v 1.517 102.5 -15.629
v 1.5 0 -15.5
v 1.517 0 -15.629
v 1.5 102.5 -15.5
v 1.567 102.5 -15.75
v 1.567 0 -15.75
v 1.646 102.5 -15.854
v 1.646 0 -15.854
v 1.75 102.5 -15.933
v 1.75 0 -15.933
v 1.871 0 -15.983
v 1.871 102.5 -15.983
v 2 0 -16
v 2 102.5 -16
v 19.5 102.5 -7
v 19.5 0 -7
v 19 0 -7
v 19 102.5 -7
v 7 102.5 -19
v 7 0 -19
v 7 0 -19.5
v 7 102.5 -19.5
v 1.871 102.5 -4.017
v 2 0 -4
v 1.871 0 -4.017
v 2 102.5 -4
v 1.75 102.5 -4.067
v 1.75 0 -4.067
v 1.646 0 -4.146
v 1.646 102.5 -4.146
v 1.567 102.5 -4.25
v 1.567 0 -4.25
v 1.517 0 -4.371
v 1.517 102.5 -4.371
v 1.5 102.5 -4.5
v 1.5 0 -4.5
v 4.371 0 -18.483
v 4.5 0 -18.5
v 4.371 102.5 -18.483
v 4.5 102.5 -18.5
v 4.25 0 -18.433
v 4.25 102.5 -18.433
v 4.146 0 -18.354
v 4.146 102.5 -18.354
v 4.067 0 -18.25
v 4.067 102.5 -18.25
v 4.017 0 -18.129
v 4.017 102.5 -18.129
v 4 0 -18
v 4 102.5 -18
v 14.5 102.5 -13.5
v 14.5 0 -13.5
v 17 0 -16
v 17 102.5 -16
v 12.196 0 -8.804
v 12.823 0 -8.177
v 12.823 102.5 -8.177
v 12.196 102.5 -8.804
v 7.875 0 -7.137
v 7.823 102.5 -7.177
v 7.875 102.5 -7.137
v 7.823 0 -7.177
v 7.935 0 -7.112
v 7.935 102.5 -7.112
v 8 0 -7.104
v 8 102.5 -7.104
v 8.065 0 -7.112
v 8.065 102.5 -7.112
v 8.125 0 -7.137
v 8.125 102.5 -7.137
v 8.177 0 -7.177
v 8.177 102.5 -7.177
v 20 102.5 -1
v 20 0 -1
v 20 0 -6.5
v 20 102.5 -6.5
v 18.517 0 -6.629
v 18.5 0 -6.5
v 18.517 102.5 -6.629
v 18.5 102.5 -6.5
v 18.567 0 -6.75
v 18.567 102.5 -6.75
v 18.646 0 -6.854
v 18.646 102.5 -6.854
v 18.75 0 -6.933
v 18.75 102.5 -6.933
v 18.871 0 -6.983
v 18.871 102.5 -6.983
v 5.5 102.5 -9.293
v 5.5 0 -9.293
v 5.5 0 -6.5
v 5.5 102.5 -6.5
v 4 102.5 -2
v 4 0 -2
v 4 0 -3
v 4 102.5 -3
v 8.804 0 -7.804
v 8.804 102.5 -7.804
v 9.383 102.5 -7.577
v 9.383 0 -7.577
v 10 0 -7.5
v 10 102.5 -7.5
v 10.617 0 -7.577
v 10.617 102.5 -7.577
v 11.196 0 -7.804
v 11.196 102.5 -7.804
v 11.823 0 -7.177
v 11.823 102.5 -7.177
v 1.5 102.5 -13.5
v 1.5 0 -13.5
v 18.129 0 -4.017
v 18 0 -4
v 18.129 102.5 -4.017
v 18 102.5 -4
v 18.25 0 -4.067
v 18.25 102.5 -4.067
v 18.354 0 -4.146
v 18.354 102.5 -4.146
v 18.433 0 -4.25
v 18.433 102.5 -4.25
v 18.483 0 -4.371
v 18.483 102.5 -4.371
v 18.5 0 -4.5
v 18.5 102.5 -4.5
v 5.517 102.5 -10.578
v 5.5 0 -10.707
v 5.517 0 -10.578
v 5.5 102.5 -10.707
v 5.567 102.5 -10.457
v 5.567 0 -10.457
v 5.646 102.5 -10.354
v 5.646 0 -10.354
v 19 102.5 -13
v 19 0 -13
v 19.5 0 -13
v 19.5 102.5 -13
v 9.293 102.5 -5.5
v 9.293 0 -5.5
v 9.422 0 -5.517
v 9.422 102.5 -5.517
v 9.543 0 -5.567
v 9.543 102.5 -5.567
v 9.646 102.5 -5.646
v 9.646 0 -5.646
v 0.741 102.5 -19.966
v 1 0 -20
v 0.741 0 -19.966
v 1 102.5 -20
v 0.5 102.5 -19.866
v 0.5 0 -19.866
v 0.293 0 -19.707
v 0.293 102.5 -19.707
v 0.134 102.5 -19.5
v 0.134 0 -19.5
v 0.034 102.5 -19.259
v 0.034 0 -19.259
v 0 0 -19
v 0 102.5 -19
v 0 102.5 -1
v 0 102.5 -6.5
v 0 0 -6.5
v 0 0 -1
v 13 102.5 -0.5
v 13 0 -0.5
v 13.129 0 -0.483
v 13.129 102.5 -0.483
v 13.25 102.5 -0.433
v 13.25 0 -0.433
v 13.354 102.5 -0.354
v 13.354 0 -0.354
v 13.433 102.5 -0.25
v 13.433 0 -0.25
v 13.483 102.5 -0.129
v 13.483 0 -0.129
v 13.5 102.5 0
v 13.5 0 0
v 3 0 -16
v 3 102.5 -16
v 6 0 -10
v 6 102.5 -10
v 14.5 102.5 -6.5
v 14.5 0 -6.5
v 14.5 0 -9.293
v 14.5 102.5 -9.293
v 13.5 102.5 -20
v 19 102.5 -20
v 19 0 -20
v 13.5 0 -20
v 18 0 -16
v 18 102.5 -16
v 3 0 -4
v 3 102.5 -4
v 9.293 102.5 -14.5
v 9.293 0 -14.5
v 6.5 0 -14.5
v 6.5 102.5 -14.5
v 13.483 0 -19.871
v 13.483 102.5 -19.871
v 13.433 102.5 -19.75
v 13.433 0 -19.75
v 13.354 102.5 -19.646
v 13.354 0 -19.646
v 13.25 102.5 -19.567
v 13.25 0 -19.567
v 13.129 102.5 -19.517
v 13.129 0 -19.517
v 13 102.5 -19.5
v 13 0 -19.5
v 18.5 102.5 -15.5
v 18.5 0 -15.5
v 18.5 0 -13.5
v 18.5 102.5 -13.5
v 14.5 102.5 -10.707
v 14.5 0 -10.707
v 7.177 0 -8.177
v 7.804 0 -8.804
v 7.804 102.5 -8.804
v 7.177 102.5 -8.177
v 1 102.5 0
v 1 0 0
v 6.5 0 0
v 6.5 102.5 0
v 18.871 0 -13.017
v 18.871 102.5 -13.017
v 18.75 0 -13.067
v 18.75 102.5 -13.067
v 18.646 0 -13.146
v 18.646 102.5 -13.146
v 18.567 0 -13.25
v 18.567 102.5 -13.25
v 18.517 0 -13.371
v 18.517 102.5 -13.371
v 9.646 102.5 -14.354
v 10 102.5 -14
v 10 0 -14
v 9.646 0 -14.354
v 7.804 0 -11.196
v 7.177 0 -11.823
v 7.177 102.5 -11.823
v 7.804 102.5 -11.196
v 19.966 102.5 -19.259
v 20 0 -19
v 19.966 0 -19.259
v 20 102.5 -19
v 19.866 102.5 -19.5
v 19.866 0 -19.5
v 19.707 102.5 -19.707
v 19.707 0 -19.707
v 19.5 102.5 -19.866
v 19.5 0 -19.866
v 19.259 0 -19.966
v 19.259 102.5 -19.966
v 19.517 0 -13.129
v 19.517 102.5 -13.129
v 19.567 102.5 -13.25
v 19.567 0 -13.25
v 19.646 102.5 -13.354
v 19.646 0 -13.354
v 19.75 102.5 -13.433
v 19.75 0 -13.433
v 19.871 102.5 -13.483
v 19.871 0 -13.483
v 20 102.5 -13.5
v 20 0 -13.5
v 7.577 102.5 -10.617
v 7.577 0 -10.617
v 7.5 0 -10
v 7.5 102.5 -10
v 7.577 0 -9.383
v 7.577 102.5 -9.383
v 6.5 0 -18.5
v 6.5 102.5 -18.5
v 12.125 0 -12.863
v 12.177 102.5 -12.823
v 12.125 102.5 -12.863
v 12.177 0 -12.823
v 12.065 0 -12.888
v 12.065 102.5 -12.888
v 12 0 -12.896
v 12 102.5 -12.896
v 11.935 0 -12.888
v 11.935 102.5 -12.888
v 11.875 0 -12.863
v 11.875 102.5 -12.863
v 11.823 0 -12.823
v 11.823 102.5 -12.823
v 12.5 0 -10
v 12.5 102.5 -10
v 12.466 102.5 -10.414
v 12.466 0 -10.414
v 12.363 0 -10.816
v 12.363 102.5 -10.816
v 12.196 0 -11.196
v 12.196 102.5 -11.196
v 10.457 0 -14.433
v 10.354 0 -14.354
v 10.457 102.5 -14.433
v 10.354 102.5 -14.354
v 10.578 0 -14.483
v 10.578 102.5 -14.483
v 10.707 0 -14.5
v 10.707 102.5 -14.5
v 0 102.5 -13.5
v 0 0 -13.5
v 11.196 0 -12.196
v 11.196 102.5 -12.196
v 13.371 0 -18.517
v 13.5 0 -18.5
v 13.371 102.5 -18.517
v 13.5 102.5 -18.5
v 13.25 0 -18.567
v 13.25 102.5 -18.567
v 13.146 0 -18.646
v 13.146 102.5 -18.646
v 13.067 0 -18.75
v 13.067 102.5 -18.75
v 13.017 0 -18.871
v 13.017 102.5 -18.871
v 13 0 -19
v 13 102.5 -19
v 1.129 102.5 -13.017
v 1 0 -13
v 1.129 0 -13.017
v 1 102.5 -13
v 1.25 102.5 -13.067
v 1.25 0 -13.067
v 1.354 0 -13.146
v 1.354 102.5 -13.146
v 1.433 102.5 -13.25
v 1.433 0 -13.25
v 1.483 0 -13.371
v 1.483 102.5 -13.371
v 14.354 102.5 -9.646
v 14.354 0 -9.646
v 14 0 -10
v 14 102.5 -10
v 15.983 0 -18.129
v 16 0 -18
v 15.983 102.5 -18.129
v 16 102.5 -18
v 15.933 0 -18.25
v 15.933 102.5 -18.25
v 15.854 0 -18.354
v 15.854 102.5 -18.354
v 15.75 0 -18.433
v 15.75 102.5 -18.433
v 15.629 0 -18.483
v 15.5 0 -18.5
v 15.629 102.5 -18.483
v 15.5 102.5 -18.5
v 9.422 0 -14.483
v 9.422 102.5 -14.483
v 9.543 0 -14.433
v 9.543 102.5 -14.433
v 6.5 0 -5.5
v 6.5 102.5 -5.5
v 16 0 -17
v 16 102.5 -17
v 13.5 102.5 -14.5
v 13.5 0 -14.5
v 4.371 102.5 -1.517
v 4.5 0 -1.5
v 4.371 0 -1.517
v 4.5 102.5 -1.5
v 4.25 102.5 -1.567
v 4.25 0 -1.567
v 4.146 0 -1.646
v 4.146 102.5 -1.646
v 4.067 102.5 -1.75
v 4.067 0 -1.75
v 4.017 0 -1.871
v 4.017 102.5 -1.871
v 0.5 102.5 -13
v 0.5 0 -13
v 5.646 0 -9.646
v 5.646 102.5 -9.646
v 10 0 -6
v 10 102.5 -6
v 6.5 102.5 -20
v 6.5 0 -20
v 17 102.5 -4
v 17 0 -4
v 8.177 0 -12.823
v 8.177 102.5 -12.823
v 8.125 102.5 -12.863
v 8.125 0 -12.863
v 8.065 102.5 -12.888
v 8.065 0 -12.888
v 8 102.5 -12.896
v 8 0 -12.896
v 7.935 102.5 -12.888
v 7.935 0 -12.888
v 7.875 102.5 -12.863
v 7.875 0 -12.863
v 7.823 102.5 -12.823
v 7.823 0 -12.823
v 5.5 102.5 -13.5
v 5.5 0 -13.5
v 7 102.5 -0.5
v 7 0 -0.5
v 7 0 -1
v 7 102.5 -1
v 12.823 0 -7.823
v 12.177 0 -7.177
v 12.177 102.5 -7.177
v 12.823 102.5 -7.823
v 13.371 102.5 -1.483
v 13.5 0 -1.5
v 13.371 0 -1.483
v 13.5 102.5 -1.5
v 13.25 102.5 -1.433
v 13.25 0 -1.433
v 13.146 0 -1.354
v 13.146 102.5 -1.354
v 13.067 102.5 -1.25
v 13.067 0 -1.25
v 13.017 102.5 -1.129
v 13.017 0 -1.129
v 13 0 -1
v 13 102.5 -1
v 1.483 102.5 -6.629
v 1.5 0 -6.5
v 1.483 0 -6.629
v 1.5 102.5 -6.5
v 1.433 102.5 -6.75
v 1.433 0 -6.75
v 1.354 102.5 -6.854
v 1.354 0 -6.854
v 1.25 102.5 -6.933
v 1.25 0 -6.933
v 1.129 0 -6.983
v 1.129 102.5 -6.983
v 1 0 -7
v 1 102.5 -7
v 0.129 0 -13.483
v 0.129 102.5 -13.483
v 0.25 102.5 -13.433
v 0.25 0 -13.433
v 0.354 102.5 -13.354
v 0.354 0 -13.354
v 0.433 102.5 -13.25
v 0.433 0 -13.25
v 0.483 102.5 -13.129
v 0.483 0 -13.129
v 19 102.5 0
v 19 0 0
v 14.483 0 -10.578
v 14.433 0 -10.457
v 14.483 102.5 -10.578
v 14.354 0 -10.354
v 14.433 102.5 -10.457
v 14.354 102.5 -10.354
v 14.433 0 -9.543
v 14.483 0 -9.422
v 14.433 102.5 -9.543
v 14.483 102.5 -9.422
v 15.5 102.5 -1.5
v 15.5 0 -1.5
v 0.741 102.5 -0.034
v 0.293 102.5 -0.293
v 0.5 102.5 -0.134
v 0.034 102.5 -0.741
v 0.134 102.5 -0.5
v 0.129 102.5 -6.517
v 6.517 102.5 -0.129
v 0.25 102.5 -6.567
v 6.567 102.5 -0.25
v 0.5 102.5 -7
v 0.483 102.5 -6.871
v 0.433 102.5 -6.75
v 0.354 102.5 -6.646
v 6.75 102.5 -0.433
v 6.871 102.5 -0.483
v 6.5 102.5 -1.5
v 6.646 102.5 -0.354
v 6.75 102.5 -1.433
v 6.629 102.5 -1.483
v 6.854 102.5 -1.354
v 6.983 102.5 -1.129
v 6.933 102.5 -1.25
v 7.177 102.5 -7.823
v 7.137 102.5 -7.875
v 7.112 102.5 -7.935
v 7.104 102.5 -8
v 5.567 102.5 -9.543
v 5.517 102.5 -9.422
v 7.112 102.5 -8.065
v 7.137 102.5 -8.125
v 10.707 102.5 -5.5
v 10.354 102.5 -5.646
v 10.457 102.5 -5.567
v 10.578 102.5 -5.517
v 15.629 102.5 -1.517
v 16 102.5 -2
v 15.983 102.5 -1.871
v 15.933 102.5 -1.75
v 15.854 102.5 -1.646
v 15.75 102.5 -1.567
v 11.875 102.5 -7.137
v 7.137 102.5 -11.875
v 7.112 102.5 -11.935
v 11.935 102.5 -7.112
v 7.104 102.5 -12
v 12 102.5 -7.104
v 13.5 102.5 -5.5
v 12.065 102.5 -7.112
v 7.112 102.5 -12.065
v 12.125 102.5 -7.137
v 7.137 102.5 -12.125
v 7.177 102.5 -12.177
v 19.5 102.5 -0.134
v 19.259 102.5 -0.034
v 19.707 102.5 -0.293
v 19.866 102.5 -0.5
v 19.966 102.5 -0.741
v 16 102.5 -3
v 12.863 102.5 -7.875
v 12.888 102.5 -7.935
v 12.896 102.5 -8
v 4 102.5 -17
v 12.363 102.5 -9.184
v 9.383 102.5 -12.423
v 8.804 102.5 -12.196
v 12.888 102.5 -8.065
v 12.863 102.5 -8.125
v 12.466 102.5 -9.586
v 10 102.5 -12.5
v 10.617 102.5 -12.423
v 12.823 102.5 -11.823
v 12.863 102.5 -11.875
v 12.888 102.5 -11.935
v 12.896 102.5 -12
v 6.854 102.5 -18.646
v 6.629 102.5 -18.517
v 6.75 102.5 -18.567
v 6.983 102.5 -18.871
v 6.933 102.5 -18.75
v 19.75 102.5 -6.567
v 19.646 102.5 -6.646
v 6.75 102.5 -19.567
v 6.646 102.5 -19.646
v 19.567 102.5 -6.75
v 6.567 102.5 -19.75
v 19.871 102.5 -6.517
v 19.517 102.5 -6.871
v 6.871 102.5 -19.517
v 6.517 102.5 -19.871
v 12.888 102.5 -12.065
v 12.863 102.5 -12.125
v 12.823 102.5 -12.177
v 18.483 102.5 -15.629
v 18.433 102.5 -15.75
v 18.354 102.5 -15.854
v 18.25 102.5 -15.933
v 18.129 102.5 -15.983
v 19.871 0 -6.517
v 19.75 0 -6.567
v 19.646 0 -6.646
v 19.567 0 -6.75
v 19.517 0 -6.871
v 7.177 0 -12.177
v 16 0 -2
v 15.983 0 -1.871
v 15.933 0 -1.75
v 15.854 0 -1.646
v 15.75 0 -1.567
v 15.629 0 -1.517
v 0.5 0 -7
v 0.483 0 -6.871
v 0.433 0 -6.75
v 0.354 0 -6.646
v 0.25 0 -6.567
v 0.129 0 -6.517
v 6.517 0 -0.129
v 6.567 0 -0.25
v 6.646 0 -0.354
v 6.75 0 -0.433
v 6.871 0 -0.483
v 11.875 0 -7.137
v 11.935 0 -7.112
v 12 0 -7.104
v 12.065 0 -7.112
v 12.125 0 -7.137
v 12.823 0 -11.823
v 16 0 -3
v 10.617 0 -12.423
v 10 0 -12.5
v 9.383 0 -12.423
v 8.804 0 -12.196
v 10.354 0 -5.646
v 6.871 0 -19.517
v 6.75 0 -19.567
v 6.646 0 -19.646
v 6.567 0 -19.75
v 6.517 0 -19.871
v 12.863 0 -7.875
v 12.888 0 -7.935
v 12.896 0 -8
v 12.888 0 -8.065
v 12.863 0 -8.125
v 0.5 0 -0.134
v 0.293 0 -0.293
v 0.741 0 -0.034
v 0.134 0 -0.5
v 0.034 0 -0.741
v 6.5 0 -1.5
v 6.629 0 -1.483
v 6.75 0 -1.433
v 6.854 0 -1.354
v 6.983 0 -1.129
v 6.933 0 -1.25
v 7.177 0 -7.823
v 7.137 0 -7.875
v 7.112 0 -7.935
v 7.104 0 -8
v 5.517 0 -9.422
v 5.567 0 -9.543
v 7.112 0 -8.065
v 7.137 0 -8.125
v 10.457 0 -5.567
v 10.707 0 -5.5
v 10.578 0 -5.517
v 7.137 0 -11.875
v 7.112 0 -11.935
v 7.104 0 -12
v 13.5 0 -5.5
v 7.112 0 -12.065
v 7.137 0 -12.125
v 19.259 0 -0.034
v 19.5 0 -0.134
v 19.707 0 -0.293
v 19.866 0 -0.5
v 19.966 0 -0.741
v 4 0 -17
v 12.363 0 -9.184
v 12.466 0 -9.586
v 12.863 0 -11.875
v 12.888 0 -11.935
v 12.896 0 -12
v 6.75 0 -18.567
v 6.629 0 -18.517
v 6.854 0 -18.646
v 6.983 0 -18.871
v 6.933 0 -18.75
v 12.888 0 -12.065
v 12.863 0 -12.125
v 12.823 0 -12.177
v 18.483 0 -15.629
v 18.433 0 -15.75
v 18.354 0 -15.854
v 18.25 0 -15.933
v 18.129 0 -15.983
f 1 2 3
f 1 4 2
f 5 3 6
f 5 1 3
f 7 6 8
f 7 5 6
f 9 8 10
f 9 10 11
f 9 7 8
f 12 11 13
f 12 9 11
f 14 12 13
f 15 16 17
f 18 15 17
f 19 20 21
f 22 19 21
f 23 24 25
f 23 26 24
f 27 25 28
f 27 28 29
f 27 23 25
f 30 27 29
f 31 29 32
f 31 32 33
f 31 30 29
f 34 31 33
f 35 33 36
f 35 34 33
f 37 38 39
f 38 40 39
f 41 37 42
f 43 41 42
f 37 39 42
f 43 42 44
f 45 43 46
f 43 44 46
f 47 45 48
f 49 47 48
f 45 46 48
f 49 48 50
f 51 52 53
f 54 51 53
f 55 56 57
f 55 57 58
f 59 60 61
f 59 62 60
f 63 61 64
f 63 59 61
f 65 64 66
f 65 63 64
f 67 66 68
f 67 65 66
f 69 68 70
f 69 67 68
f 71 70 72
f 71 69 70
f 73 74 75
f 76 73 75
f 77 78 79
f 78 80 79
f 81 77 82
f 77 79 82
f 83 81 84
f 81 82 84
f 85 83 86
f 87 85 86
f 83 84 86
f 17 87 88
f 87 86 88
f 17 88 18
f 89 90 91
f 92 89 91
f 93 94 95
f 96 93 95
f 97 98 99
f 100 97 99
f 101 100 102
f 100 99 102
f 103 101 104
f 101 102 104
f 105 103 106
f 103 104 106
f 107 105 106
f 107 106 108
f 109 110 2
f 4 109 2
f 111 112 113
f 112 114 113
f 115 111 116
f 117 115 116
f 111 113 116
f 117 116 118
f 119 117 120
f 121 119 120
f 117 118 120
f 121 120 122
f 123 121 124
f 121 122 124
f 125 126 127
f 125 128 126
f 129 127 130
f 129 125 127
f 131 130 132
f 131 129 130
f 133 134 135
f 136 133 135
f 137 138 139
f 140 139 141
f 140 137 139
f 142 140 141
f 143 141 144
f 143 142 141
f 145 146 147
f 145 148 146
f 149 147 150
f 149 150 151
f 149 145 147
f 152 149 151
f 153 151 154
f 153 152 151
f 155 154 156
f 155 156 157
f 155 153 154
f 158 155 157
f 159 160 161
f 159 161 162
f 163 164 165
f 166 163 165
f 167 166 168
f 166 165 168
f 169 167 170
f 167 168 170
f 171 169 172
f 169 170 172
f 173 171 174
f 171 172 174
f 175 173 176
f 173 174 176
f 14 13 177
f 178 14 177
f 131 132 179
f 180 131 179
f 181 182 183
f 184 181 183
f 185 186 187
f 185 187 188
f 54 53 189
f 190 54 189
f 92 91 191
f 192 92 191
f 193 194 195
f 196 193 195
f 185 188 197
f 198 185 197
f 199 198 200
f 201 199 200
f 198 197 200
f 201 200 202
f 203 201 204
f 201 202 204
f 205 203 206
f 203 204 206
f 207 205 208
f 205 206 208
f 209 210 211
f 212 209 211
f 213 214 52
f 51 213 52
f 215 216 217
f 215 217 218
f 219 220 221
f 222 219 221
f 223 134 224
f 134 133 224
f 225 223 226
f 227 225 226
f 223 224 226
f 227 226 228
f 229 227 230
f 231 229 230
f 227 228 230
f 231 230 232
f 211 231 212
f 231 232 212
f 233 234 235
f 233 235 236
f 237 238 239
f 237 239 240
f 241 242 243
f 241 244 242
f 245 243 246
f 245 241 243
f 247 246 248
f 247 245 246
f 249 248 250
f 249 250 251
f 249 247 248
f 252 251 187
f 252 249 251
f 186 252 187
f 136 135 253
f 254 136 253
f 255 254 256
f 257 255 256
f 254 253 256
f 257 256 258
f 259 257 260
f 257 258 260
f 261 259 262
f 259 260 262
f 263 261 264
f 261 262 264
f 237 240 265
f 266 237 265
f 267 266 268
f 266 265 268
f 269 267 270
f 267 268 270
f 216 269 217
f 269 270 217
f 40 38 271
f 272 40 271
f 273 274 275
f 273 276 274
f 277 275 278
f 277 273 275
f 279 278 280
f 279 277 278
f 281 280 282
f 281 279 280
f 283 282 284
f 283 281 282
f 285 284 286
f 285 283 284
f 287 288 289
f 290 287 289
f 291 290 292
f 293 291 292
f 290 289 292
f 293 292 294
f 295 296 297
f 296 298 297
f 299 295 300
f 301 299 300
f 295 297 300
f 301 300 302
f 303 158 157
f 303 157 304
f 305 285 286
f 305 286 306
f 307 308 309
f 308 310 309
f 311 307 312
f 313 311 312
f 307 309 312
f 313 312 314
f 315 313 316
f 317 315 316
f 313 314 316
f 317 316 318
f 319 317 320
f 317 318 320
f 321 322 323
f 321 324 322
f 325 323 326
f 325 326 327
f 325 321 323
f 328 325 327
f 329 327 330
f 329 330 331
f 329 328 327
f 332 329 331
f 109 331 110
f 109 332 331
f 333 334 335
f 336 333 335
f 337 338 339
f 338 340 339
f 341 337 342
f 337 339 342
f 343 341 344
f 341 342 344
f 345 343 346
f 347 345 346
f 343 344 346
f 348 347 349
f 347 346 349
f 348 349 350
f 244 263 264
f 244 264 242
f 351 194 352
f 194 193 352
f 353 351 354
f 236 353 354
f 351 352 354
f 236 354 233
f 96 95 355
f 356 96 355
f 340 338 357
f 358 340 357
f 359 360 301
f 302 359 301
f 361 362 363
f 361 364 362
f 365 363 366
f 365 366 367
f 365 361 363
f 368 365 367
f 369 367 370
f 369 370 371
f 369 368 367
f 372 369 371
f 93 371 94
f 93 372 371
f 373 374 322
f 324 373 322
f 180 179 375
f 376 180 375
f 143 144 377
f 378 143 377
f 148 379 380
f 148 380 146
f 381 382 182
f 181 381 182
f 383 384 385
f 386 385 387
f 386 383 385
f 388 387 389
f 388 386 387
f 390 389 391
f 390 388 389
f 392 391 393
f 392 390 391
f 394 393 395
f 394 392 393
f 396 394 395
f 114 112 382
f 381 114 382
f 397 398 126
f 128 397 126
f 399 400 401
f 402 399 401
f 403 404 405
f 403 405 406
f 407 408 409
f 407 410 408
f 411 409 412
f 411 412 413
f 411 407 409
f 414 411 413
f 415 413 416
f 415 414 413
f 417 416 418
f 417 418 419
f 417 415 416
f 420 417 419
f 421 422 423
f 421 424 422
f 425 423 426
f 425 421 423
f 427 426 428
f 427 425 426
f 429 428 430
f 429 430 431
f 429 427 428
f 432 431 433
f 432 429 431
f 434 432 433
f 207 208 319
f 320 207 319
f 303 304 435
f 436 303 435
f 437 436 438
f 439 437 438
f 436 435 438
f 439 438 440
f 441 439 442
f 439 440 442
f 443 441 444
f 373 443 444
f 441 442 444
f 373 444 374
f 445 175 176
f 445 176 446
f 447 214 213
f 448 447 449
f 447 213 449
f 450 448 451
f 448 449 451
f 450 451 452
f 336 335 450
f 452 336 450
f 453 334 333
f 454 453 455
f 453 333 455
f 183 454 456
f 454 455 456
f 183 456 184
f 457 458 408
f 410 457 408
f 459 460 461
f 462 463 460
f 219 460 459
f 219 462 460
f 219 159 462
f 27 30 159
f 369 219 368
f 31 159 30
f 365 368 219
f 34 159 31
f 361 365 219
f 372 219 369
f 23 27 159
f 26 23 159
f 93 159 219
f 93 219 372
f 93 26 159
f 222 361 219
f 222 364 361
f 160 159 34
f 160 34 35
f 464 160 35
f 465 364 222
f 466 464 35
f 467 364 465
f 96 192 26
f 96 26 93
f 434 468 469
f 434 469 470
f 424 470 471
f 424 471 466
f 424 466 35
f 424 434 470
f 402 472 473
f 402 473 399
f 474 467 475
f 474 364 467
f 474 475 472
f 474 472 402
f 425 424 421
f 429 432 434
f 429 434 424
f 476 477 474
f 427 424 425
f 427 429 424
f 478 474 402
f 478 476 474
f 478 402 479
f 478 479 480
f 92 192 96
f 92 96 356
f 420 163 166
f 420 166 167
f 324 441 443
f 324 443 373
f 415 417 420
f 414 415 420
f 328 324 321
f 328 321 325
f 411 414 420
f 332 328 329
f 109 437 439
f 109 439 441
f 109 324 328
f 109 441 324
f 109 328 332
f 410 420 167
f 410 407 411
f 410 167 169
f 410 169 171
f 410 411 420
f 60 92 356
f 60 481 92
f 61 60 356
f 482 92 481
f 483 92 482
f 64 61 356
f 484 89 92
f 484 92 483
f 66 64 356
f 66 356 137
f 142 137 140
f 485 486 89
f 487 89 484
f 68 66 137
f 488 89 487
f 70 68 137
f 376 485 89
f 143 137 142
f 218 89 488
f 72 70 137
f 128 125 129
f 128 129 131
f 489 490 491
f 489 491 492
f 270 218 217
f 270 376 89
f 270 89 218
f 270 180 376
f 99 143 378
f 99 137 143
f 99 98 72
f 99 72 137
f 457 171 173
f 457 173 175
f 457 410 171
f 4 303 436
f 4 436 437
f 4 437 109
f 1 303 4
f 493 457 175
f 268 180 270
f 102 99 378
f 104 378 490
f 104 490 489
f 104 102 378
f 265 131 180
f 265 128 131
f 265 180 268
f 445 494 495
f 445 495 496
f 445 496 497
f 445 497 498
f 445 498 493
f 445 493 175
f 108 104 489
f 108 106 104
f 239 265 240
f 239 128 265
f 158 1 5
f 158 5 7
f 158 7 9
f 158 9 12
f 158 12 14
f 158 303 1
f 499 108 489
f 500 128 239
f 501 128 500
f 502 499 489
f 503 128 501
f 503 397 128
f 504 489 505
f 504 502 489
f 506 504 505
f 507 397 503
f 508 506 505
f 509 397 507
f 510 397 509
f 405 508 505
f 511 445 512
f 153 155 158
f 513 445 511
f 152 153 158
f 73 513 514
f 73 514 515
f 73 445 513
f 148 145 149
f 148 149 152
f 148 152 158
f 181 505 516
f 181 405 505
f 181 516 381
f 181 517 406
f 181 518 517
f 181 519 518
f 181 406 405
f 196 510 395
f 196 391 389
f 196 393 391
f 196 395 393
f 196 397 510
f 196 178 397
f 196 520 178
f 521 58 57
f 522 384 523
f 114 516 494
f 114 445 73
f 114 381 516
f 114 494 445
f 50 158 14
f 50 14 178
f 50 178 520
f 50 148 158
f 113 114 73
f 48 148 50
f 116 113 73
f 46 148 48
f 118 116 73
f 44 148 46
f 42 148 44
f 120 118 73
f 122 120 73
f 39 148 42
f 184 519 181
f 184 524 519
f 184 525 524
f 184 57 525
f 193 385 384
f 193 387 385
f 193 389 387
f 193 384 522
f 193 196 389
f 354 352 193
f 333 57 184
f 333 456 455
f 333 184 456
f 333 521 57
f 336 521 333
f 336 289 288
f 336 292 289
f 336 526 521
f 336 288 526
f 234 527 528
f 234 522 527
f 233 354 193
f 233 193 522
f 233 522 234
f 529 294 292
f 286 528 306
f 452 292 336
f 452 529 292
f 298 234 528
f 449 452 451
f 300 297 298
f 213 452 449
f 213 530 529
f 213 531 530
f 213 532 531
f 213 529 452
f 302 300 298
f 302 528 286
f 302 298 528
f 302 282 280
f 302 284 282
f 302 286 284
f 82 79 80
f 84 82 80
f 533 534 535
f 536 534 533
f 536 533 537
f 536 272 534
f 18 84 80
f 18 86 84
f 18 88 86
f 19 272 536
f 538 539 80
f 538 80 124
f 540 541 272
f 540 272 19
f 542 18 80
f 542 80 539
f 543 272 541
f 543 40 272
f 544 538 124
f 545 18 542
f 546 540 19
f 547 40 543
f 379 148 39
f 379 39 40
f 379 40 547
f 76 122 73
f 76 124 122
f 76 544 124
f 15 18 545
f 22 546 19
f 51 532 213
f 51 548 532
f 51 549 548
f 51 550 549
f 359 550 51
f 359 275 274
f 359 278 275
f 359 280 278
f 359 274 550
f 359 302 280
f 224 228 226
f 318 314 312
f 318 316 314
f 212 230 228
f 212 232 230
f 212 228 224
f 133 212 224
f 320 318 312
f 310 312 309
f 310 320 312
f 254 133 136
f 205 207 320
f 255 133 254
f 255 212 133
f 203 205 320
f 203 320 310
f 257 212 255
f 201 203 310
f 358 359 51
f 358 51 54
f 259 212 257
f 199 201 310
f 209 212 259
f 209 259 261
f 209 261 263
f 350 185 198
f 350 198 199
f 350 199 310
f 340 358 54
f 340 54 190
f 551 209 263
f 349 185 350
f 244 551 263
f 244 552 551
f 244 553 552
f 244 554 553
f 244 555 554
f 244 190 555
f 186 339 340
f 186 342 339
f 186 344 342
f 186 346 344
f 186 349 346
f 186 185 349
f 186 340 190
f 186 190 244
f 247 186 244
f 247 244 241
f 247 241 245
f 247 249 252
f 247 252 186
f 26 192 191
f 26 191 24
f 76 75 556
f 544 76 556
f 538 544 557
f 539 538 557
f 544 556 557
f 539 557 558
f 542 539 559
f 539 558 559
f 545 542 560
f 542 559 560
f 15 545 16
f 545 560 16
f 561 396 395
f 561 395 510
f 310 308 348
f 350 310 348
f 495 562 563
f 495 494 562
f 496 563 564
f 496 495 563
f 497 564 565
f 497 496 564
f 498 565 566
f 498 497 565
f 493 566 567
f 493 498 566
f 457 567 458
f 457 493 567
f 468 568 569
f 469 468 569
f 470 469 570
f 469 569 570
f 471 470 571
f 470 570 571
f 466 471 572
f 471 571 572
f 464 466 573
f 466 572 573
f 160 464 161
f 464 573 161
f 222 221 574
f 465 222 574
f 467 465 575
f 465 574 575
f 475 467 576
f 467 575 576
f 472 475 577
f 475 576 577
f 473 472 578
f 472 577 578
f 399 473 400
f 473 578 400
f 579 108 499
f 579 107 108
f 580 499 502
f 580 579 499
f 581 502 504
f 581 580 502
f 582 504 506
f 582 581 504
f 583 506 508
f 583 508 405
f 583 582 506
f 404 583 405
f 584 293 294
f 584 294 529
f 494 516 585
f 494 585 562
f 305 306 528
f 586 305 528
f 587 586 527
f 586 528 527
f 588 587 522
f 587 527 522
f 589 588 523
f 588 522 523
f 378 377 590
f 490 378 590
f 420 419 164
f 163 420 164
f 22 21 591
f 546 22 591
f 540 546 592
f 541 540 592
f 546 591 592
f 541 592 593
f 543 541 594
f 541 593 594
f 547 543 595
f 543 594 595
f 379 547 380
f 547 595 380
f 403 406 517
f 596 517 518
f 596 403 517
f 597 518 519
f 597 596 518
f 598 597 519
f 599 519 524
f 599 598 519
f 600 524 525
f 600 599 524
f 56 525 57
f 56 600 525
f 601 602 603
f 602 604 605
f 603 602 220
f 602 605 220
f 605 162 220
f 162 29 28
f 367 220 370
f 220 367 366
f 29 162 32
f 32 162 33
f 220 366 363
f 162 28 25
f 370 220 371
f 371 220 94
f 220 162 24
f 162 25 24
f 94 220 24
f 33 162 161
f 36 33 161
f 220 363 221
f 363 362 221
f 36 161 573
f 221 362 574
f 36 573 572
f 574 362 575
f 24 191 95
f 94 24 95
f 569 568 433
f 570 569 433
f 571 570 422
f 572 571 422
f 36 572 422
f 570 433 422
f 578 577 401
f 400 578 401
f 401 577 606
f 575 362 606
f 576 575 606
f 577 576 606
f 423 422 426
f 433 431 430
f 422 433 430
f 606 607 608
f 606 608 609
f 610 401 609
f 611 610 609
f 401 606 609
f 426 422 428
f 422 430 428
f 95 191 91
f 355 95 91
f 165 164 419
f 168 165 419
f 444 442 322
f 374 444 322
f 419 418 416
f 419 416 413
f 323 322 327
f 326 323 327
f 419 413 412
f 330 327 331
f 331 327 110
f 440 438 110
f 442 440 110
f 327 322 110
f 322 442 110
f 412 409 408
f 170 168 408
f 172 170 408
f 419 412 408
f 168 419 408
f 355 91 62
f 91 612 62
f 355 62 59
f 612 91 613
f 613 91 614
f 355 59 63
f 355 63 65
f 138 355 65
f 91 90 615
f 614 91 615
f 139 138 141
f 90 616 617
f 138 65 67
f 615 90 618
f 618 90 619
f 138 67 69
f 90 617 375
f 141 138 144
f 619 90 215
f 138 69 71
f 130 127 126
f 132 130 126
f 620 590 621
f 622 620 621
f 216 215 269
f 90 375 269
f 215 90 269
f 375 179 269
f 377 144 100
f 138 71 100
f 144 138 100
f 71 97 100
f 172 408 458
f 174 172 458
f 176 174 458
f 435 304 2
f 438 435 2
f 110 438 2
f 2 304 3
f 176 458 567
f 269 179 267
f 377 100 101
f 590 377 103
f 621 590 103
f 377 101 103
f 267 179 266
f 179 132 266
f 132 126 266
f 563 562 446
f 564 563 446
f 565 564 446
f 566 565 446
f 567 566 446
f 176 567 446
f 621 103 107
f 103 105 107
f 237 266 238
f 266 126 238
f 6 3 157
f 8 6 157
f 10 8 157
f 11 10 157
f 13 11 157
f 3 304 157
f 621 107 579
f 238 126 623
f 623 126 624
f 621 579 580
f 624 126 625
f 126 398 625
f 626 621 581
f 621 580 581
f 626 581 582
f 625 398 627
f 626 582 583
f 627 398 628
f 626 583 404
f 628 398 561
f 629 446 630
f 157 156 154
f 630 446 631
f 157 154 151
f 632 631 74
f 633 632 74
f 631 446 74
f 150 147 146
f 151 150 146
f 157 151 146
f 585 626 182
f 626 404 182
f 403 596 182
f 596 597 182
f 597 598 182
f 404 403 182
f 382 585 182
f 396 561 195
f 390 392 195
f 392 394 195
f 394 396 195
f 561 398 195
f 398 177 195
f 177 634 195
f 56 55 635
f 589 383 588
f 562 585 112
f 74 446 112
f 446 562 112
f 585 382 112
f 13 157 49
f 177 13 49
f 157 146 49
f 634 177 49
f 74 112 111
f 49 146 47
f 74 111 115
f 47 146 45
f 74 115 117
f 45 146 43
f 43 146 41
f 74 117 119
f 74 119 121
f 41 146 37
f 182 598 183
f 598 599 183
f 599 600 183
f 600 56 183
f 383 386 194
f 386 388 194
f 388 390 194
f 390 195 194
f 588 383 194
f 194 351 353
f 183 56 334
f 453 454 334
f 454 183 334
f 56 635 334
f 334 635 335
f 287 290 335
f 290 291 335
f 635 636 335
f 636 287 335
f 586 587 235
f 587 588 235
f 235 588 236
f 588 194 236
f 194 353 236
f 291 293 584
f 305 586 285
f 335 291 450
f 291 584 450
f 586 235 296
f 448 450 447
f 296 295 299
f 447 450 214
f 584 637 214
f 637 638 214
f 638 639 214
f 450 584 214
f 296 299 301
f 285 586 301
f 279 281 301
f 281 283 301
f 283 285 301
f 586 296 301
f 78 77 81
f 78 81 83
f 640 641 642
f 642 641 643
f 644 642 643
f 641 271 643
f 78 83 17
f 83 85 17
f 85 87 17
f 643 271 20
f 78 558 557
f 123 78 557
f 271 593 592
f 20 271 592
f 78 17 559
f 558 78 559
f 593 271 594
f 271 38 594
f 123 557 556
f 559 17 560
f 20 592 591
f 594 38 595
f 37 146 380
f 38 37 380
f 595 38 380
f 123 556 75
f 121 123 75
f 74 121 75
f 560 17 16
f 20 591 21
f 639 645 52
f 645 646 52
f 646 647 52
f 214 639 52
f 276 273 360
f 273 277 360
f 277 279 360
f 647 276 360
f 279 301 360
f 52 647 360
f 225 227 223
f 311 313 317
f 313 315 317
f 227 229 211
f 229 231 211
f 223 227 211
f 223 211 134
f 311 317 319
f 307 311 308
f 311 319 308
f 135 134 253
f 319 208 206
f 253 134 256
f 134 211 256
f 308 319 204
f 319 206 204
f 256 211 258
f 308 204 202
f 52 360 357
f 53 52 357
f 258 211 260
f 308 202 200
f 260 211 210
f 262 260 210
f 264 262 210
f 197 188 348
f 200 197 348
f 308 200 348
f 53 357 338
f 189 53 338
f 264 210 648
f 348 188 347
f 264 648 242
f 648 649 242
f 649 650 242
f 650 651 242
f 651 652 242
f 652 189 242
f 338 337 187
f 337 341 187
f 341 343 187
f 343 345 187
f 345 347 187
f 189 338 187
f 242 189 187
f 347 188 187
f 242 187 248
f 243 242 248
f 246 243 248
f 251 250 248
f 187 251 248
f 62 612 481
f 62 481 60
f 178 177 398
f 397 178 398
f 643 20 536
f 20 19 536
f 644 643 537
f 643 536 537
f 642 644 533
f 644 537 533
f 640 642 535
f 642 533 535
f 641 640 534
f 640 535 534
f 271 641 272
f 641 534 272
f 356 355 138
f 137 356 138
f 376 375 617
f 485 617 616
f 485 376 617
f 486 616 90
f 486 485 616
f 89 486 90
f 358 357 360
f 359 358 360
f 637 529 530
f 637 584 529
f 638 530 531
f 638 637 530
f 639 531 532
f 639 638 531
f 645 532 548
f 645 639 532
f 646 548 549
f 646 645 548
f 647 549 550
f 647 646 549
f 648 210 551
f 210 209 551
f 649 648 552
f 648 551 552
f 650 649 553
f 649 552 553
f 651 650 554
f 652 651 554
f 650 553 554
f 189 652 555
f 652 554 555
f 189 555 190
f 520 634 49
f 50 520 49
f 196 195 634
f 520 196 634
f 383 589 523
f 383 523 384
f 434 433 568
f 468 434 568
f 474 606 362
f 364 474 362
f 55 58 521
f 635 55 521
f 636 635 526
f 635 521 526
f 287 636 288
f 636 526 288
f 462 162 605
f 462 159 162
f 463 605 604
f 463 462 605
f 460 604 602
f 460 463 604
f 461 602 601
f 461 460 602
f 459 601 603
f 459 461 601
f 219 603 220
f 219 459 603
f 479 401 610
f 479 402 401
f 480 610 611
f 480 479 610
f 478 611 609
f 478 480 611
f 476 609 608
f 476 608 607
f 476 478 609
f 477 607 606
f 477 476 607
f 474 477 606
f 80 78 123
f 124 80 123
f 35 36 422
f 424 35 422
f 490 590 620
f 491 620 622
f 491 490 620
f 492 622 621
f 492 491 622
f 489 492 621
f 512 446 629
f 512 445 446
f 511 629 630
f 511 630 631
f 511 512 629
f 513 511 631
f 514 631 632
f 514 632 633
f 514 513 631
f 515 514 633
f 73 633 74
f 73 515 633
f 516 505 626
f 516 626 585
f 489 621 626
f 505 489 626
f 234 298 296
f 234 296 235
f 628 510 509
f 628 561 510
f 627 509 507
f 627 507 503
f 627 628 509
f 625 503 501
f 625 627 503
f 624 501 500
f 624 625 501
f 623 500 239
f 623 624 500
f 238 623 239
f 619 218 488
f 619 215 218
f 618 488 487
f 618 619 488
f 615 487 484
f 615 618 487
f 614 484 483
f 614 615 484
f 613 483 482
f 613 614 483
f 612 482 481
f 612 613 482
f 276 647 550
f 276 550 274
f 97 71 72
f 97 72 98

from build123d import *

# Parameters (mm, degrees)
BOSS_EXTRUDE1_DEPTH = 102.5
FILLET1_R           = 1
CUT_EXTRUDE1_DEPTH  = 103.5
FILLET2_R           = 0.5
FILLET3_R           = 0.25


with BuildPart() as part:
    # Sketch3 → Boss-Extrude1 (new body)
    with BuildSketch(Plane(origin=(0, 0, 0), x_dir=(1, 0, 0), z_dir=(0, 1, 0))):
        with BuildLine():
            Line((7, 18.5), (7, 19.5))
            ThreePointArc((7, 19.5), (6.646446609, 19.646446609), (6.5, 20))
            Line((6.5, 20), (0, 20))
            Line((0, 20), (0, 13.5))
            ThreePointArc((0, 13.5), (0.353553391, 13.353553391), (0.5, 13))
            Line((0.5, 13), (1.5, 13))
            Line((1.5, 13), (1.5, 16))
            Line((1.5, 16), (3, 16))
            Line((3, 16), (5.5, 13.5))
            Line((5.5, 13.5), (5.5, 10.5))
            Line((5.5, 10.5), (6, 10))
            Line((6, 10), (5.5, 9.5))
            Line((5.5, 9.5), (5.5, 6.5))
            Line((5.5, 6.5), (3, 4))
            Line((3, 4), (1.5, 4))
            Line((1.5, 4), (1.5, 7))
            Line((1.5, 7), (0.5, 7))
            ThreePointArc((0.5, 7), (0.353553391, 6.646446609), (0, 6.5))
            Line((0, 6.5), (0, 0))
            Line((0, 0), (6.5, 0))
            ThreePointArc((6.5, 0), (6.646446609, 0.353553391), (7, 0.5))
            Line((7, 0.5), (7, 1.5))
            Line((7, 1.5), (4, 1.5))
            Line((4, 1.5), (4, 3))
            Line((4, 3), (6.5, 5.5))
            Line((6.5, 5.5), (9.5, 5.5))
            Line((9.5, 5.5), (10, 6))
            Line((10, 6), (10.5, 5.5))
            Line((10.5, 5.5), (13.5, 5.5))
            Line((13.5, 5.5), (16, 3))
            Line((16, 3), (16, 1.5))
            Line((16, 1.5), (13, 1.5))
            Line((13, 1.5), (13, 0.5))
            ThreePointArc((13, 0.5), (13.353553391, 0.353553391), (13.5, 0))
            Line((13.5, 0), (20, 0))
            Line((20, 0), (20, 6.5))
            ThreePointArc((20, 6.5), (19.646446609, 6.646446609), (19.5, 7))
            Line((19.5, 7), (18.5, 7))
            Line((18.5, 7), (18.5, 4))
            Line((18.5, 4), (17, 4))
            Line((17, 4), (14.5, 6.5))
            Line((14.5, 6.5), (14.5, 9.5))
            Line((14.5, 9.5), (14, 10))
            Line((14, 10), (14.5, 10.5))
            Line((14.5, 10.5), (14.5, 13.5))
            Line((14.5, 13.5), (17, 16))
            Line((17, 16), (18.5, 16))
            Line((18.5, 16), (18.5, 13))
            Line((18.5, 13), (19.5, 13))
            ThreePointArc((19.5, 13), (19.646446609, 13.353553391), (20, 13.5))
            Line((20, 13.5), (20, 20))
            Line((20, 20), (13.5, 20))
            ThreePointArc((13.5, 20), (13.353553391, 19.646446609), (13, 19.5))
            Line((13, 19.5), (13, 18.5))
            Line((13, 18.5), (16, 18.5))
            Line((16, 18.5), (16, 17))
            Line((16, 17), (13.5, 14.5))
            Line((13.5, 14.5), (10.5, 14.5))
            Line((10.5, 14.5), (10, 14))
            Line((10, 14), (9.5, 14.5))
            Line((9.5, 14.5), (6.5, 14.5))
            Line((6.5, 14.5), (4, 17))
            Line((4, 17), (4, 18.5))
            Line((4, 18.5), (7, 18.5))
        make_face()
    extrude(amount=BOSS_EXTRUDE1_DEPTH)

    # Fillet1
    fillet1_edges = [part.edges().sort_by_distance(p)[0] for p in [
        (20, 51.25, 0),
        (0, 51.25, 0),
        (0, 51.25, -20),
        (20, 51.25, -20),
    ]]
    fillet(fillet1_edges, radius=FILLET1_R)

    # Sketch4 → Cut-Extrude1 (cut, through all)
    with BuildSketch(Plane(origin=(0, 102.5, 0), x_dir=(1, 0, 0), z_dir=(0, 1, 0))):
        with BuildLine():
            Line((10, 11), (11.195582496, 12.195582496))
            ThreePointArc((11.195582496, 12.195582496), (10, 12.5), (8.804417504, 12.195582496))
            Line((8.804417504, 12.195582496), (10, 11))
        make_face()
        with BuildLine():
            ThreePointArc((12.195582496, 11.195582496), (11.767766953, 11.767766953), (11.195582496, 12.195582496))
            Line((11.195582496, 12.195582496), (10, 11))
            Line((10, 11), (11, 10))
            Line((11, 10), (12.195582496, 11.195582496))
        make_face()
        with BuildLine():
            Line((9, 10), (10, 11))
            Line((10, 11), (8.804417504, 12.195582496))
            ThreePointArc((8.804417504, 12.195582496), (8.232233047, 11.767766953), (7.804417504, 11.195582496))
            Line((7.804417504, 11.195582496), (9, 10))
        make_face()
        Polygon((11, 10), (10, 11), (9, 10), (10, 9), align=None)
        with BuildLine():
            Line((7.804417504, 8.804417504), (9, 10))
            Line((9, 10), (7.804417504, 11.195582496))
            ThreePointArc((7.804417504, 11.195582496), (7.5, 10), (7.804417504, 8.804417504))
        make_face()
        with BuildLine():
            Line((10, 9), (9, 10))
            Line((9, 10), (7.804417504, 8.804417504))
            ThreePointArc((7.804417504, 8.804417504), (8.232233047, 8.232233047), (8.804417504, 7.804417504))
            Line((8.804417504, 7.804417504), (10, 9))
        make_face()
        with BuildLine():
            Line((11.195582496, 7.804417504), (10, 9))
            Line((10, 9), (8.804417504, 7.804417504))
            ThreePointArc((8.804417504, 7.804417504), (10, 7.5), (11.195582496, 7.804417504))
        make_face()
        with BuildLine():
            Line((12.195582496, 8.804417504), (11, 10))
            Line((11, 10), (10, 9))
            Line((10, 9), (11.195582496, 7.804417504))
            ThreePointArc((11.195582496, 7.804417504), (11.767766953, 8.232233047), (12.195582496, 8.804417504))
        make_face()
        with BuildLine():
            ThreePointArc((12.5, 10), (12.422700584, 10.616864556), (12.195582496, 11.195582496))
            Line((12.195582496, 11.195582496), (11, 10))
            Line((11, 10), (12.195582496, 8.804417504))
            ThreePointArc((12.195582496, 8.804417504), (12.422700584, 9.383135444), (12.5, 10))
        make_face()
        with BuildLine():
            ThreePointArc((8.804417504, 7.804417504), (8.232233047, 8.232233047), (7.804417504, 8.804417504))
            Line((7.804417504, 8.804417504), (7, 8))
            Line((7, 8), (8, 7))
            Line((8, 7), (8.804417504, 7.804417504))
        make_face()
        with BuildLine():
            Line((13, 8), (12.195582496, 8.804417504))
            ThreePointArc((12.195582496, 8.804417504), (11.767766953, 8.232233047), (11.195582496, 7.804417504))
            Line((11.195582496, 7.804417504), (12, 7))
            Line((12, 7), (13, 8))
        make_face()
        with BuildLine():
            Line((13, 12), (12, 13))
            Line((12, 13), (11.195582496, 12.195582496))
            ThreePointArc((11.195582496, 12.195582496), (11.767766953, 11.767766953), (12.195582496, 11.195582496))
            Line((12.195582496, 11.195582496), (13, 12))
        make_face()
        with BuildLine():
            ThreePointArc((7.804417504, 11.195582496), (8.232233047, 11.767766953), (8.804417504, 12.195582496))
            Line((8.804417504, 12.195582496), (8, 13))
            Line((8, 13), (7, 12))
            Line((7, 12), (7.804417504, 11.195582496))
        make_face()
    extrude(amount=-CUT_EXTRUDE1_DEPTH, mode=Mode.SUBTRACT)

    # Fillet2
    fillet2_edges = [part.edges().sort_by_distance(p)[0] for p in [
        (18.5, 51.25, -13),
        (18.5, 51.25, -16),
        (14.5, 51.25, -10.5),
        (14.5, 51.25, -9.5),
        (18.5, 51.25, -4),
        (18.5, 51.25, -7),
        (13, 51.25, -1.5),
        (16, 51.25, -1.5),
        (10.5, 51.25, -5.5),
        (9.5, 51.25, -5.5),
        (4, 51.25, -1.5),
        (7, 51.25, -1.5),
        (1.5, 51.25, -7),
        (1.5, 51.25, -4),
        (5.5, 51.25, -9.5),
        (5.5, 51.25, -10.5),
        (1.5, 51.25, -16),
        (1.5, 51.25, -13),
        (7, 51.25, -18.5),
        (4, 51.25, -18.5),
        (9.5, 51.25, -14.5),
        (10.5, 51.25, -14.5),
        (16, 51.25, -18.5),
        (13, 51.25, -18.5),
    ]]
    fillet(fillet2_edges, radius=FILLET2_R)

    # Fillet3
    fillet3_edges = [part.edges().sort_by_distance(p)[0] for p in [
        (7, 51.25, -12),
        (8, 51.25, -13),
        (12, 51.25, -13),
        (13, 51.25, -12),
        (13, 51.25, -8),
        (12, 51.25, -7),
        (8, 51.25, -7),
        (7, 51.25, -8),
    ]]
    fillet(fillet3_edges, radius=FILLET3_R)


solid = part.part
